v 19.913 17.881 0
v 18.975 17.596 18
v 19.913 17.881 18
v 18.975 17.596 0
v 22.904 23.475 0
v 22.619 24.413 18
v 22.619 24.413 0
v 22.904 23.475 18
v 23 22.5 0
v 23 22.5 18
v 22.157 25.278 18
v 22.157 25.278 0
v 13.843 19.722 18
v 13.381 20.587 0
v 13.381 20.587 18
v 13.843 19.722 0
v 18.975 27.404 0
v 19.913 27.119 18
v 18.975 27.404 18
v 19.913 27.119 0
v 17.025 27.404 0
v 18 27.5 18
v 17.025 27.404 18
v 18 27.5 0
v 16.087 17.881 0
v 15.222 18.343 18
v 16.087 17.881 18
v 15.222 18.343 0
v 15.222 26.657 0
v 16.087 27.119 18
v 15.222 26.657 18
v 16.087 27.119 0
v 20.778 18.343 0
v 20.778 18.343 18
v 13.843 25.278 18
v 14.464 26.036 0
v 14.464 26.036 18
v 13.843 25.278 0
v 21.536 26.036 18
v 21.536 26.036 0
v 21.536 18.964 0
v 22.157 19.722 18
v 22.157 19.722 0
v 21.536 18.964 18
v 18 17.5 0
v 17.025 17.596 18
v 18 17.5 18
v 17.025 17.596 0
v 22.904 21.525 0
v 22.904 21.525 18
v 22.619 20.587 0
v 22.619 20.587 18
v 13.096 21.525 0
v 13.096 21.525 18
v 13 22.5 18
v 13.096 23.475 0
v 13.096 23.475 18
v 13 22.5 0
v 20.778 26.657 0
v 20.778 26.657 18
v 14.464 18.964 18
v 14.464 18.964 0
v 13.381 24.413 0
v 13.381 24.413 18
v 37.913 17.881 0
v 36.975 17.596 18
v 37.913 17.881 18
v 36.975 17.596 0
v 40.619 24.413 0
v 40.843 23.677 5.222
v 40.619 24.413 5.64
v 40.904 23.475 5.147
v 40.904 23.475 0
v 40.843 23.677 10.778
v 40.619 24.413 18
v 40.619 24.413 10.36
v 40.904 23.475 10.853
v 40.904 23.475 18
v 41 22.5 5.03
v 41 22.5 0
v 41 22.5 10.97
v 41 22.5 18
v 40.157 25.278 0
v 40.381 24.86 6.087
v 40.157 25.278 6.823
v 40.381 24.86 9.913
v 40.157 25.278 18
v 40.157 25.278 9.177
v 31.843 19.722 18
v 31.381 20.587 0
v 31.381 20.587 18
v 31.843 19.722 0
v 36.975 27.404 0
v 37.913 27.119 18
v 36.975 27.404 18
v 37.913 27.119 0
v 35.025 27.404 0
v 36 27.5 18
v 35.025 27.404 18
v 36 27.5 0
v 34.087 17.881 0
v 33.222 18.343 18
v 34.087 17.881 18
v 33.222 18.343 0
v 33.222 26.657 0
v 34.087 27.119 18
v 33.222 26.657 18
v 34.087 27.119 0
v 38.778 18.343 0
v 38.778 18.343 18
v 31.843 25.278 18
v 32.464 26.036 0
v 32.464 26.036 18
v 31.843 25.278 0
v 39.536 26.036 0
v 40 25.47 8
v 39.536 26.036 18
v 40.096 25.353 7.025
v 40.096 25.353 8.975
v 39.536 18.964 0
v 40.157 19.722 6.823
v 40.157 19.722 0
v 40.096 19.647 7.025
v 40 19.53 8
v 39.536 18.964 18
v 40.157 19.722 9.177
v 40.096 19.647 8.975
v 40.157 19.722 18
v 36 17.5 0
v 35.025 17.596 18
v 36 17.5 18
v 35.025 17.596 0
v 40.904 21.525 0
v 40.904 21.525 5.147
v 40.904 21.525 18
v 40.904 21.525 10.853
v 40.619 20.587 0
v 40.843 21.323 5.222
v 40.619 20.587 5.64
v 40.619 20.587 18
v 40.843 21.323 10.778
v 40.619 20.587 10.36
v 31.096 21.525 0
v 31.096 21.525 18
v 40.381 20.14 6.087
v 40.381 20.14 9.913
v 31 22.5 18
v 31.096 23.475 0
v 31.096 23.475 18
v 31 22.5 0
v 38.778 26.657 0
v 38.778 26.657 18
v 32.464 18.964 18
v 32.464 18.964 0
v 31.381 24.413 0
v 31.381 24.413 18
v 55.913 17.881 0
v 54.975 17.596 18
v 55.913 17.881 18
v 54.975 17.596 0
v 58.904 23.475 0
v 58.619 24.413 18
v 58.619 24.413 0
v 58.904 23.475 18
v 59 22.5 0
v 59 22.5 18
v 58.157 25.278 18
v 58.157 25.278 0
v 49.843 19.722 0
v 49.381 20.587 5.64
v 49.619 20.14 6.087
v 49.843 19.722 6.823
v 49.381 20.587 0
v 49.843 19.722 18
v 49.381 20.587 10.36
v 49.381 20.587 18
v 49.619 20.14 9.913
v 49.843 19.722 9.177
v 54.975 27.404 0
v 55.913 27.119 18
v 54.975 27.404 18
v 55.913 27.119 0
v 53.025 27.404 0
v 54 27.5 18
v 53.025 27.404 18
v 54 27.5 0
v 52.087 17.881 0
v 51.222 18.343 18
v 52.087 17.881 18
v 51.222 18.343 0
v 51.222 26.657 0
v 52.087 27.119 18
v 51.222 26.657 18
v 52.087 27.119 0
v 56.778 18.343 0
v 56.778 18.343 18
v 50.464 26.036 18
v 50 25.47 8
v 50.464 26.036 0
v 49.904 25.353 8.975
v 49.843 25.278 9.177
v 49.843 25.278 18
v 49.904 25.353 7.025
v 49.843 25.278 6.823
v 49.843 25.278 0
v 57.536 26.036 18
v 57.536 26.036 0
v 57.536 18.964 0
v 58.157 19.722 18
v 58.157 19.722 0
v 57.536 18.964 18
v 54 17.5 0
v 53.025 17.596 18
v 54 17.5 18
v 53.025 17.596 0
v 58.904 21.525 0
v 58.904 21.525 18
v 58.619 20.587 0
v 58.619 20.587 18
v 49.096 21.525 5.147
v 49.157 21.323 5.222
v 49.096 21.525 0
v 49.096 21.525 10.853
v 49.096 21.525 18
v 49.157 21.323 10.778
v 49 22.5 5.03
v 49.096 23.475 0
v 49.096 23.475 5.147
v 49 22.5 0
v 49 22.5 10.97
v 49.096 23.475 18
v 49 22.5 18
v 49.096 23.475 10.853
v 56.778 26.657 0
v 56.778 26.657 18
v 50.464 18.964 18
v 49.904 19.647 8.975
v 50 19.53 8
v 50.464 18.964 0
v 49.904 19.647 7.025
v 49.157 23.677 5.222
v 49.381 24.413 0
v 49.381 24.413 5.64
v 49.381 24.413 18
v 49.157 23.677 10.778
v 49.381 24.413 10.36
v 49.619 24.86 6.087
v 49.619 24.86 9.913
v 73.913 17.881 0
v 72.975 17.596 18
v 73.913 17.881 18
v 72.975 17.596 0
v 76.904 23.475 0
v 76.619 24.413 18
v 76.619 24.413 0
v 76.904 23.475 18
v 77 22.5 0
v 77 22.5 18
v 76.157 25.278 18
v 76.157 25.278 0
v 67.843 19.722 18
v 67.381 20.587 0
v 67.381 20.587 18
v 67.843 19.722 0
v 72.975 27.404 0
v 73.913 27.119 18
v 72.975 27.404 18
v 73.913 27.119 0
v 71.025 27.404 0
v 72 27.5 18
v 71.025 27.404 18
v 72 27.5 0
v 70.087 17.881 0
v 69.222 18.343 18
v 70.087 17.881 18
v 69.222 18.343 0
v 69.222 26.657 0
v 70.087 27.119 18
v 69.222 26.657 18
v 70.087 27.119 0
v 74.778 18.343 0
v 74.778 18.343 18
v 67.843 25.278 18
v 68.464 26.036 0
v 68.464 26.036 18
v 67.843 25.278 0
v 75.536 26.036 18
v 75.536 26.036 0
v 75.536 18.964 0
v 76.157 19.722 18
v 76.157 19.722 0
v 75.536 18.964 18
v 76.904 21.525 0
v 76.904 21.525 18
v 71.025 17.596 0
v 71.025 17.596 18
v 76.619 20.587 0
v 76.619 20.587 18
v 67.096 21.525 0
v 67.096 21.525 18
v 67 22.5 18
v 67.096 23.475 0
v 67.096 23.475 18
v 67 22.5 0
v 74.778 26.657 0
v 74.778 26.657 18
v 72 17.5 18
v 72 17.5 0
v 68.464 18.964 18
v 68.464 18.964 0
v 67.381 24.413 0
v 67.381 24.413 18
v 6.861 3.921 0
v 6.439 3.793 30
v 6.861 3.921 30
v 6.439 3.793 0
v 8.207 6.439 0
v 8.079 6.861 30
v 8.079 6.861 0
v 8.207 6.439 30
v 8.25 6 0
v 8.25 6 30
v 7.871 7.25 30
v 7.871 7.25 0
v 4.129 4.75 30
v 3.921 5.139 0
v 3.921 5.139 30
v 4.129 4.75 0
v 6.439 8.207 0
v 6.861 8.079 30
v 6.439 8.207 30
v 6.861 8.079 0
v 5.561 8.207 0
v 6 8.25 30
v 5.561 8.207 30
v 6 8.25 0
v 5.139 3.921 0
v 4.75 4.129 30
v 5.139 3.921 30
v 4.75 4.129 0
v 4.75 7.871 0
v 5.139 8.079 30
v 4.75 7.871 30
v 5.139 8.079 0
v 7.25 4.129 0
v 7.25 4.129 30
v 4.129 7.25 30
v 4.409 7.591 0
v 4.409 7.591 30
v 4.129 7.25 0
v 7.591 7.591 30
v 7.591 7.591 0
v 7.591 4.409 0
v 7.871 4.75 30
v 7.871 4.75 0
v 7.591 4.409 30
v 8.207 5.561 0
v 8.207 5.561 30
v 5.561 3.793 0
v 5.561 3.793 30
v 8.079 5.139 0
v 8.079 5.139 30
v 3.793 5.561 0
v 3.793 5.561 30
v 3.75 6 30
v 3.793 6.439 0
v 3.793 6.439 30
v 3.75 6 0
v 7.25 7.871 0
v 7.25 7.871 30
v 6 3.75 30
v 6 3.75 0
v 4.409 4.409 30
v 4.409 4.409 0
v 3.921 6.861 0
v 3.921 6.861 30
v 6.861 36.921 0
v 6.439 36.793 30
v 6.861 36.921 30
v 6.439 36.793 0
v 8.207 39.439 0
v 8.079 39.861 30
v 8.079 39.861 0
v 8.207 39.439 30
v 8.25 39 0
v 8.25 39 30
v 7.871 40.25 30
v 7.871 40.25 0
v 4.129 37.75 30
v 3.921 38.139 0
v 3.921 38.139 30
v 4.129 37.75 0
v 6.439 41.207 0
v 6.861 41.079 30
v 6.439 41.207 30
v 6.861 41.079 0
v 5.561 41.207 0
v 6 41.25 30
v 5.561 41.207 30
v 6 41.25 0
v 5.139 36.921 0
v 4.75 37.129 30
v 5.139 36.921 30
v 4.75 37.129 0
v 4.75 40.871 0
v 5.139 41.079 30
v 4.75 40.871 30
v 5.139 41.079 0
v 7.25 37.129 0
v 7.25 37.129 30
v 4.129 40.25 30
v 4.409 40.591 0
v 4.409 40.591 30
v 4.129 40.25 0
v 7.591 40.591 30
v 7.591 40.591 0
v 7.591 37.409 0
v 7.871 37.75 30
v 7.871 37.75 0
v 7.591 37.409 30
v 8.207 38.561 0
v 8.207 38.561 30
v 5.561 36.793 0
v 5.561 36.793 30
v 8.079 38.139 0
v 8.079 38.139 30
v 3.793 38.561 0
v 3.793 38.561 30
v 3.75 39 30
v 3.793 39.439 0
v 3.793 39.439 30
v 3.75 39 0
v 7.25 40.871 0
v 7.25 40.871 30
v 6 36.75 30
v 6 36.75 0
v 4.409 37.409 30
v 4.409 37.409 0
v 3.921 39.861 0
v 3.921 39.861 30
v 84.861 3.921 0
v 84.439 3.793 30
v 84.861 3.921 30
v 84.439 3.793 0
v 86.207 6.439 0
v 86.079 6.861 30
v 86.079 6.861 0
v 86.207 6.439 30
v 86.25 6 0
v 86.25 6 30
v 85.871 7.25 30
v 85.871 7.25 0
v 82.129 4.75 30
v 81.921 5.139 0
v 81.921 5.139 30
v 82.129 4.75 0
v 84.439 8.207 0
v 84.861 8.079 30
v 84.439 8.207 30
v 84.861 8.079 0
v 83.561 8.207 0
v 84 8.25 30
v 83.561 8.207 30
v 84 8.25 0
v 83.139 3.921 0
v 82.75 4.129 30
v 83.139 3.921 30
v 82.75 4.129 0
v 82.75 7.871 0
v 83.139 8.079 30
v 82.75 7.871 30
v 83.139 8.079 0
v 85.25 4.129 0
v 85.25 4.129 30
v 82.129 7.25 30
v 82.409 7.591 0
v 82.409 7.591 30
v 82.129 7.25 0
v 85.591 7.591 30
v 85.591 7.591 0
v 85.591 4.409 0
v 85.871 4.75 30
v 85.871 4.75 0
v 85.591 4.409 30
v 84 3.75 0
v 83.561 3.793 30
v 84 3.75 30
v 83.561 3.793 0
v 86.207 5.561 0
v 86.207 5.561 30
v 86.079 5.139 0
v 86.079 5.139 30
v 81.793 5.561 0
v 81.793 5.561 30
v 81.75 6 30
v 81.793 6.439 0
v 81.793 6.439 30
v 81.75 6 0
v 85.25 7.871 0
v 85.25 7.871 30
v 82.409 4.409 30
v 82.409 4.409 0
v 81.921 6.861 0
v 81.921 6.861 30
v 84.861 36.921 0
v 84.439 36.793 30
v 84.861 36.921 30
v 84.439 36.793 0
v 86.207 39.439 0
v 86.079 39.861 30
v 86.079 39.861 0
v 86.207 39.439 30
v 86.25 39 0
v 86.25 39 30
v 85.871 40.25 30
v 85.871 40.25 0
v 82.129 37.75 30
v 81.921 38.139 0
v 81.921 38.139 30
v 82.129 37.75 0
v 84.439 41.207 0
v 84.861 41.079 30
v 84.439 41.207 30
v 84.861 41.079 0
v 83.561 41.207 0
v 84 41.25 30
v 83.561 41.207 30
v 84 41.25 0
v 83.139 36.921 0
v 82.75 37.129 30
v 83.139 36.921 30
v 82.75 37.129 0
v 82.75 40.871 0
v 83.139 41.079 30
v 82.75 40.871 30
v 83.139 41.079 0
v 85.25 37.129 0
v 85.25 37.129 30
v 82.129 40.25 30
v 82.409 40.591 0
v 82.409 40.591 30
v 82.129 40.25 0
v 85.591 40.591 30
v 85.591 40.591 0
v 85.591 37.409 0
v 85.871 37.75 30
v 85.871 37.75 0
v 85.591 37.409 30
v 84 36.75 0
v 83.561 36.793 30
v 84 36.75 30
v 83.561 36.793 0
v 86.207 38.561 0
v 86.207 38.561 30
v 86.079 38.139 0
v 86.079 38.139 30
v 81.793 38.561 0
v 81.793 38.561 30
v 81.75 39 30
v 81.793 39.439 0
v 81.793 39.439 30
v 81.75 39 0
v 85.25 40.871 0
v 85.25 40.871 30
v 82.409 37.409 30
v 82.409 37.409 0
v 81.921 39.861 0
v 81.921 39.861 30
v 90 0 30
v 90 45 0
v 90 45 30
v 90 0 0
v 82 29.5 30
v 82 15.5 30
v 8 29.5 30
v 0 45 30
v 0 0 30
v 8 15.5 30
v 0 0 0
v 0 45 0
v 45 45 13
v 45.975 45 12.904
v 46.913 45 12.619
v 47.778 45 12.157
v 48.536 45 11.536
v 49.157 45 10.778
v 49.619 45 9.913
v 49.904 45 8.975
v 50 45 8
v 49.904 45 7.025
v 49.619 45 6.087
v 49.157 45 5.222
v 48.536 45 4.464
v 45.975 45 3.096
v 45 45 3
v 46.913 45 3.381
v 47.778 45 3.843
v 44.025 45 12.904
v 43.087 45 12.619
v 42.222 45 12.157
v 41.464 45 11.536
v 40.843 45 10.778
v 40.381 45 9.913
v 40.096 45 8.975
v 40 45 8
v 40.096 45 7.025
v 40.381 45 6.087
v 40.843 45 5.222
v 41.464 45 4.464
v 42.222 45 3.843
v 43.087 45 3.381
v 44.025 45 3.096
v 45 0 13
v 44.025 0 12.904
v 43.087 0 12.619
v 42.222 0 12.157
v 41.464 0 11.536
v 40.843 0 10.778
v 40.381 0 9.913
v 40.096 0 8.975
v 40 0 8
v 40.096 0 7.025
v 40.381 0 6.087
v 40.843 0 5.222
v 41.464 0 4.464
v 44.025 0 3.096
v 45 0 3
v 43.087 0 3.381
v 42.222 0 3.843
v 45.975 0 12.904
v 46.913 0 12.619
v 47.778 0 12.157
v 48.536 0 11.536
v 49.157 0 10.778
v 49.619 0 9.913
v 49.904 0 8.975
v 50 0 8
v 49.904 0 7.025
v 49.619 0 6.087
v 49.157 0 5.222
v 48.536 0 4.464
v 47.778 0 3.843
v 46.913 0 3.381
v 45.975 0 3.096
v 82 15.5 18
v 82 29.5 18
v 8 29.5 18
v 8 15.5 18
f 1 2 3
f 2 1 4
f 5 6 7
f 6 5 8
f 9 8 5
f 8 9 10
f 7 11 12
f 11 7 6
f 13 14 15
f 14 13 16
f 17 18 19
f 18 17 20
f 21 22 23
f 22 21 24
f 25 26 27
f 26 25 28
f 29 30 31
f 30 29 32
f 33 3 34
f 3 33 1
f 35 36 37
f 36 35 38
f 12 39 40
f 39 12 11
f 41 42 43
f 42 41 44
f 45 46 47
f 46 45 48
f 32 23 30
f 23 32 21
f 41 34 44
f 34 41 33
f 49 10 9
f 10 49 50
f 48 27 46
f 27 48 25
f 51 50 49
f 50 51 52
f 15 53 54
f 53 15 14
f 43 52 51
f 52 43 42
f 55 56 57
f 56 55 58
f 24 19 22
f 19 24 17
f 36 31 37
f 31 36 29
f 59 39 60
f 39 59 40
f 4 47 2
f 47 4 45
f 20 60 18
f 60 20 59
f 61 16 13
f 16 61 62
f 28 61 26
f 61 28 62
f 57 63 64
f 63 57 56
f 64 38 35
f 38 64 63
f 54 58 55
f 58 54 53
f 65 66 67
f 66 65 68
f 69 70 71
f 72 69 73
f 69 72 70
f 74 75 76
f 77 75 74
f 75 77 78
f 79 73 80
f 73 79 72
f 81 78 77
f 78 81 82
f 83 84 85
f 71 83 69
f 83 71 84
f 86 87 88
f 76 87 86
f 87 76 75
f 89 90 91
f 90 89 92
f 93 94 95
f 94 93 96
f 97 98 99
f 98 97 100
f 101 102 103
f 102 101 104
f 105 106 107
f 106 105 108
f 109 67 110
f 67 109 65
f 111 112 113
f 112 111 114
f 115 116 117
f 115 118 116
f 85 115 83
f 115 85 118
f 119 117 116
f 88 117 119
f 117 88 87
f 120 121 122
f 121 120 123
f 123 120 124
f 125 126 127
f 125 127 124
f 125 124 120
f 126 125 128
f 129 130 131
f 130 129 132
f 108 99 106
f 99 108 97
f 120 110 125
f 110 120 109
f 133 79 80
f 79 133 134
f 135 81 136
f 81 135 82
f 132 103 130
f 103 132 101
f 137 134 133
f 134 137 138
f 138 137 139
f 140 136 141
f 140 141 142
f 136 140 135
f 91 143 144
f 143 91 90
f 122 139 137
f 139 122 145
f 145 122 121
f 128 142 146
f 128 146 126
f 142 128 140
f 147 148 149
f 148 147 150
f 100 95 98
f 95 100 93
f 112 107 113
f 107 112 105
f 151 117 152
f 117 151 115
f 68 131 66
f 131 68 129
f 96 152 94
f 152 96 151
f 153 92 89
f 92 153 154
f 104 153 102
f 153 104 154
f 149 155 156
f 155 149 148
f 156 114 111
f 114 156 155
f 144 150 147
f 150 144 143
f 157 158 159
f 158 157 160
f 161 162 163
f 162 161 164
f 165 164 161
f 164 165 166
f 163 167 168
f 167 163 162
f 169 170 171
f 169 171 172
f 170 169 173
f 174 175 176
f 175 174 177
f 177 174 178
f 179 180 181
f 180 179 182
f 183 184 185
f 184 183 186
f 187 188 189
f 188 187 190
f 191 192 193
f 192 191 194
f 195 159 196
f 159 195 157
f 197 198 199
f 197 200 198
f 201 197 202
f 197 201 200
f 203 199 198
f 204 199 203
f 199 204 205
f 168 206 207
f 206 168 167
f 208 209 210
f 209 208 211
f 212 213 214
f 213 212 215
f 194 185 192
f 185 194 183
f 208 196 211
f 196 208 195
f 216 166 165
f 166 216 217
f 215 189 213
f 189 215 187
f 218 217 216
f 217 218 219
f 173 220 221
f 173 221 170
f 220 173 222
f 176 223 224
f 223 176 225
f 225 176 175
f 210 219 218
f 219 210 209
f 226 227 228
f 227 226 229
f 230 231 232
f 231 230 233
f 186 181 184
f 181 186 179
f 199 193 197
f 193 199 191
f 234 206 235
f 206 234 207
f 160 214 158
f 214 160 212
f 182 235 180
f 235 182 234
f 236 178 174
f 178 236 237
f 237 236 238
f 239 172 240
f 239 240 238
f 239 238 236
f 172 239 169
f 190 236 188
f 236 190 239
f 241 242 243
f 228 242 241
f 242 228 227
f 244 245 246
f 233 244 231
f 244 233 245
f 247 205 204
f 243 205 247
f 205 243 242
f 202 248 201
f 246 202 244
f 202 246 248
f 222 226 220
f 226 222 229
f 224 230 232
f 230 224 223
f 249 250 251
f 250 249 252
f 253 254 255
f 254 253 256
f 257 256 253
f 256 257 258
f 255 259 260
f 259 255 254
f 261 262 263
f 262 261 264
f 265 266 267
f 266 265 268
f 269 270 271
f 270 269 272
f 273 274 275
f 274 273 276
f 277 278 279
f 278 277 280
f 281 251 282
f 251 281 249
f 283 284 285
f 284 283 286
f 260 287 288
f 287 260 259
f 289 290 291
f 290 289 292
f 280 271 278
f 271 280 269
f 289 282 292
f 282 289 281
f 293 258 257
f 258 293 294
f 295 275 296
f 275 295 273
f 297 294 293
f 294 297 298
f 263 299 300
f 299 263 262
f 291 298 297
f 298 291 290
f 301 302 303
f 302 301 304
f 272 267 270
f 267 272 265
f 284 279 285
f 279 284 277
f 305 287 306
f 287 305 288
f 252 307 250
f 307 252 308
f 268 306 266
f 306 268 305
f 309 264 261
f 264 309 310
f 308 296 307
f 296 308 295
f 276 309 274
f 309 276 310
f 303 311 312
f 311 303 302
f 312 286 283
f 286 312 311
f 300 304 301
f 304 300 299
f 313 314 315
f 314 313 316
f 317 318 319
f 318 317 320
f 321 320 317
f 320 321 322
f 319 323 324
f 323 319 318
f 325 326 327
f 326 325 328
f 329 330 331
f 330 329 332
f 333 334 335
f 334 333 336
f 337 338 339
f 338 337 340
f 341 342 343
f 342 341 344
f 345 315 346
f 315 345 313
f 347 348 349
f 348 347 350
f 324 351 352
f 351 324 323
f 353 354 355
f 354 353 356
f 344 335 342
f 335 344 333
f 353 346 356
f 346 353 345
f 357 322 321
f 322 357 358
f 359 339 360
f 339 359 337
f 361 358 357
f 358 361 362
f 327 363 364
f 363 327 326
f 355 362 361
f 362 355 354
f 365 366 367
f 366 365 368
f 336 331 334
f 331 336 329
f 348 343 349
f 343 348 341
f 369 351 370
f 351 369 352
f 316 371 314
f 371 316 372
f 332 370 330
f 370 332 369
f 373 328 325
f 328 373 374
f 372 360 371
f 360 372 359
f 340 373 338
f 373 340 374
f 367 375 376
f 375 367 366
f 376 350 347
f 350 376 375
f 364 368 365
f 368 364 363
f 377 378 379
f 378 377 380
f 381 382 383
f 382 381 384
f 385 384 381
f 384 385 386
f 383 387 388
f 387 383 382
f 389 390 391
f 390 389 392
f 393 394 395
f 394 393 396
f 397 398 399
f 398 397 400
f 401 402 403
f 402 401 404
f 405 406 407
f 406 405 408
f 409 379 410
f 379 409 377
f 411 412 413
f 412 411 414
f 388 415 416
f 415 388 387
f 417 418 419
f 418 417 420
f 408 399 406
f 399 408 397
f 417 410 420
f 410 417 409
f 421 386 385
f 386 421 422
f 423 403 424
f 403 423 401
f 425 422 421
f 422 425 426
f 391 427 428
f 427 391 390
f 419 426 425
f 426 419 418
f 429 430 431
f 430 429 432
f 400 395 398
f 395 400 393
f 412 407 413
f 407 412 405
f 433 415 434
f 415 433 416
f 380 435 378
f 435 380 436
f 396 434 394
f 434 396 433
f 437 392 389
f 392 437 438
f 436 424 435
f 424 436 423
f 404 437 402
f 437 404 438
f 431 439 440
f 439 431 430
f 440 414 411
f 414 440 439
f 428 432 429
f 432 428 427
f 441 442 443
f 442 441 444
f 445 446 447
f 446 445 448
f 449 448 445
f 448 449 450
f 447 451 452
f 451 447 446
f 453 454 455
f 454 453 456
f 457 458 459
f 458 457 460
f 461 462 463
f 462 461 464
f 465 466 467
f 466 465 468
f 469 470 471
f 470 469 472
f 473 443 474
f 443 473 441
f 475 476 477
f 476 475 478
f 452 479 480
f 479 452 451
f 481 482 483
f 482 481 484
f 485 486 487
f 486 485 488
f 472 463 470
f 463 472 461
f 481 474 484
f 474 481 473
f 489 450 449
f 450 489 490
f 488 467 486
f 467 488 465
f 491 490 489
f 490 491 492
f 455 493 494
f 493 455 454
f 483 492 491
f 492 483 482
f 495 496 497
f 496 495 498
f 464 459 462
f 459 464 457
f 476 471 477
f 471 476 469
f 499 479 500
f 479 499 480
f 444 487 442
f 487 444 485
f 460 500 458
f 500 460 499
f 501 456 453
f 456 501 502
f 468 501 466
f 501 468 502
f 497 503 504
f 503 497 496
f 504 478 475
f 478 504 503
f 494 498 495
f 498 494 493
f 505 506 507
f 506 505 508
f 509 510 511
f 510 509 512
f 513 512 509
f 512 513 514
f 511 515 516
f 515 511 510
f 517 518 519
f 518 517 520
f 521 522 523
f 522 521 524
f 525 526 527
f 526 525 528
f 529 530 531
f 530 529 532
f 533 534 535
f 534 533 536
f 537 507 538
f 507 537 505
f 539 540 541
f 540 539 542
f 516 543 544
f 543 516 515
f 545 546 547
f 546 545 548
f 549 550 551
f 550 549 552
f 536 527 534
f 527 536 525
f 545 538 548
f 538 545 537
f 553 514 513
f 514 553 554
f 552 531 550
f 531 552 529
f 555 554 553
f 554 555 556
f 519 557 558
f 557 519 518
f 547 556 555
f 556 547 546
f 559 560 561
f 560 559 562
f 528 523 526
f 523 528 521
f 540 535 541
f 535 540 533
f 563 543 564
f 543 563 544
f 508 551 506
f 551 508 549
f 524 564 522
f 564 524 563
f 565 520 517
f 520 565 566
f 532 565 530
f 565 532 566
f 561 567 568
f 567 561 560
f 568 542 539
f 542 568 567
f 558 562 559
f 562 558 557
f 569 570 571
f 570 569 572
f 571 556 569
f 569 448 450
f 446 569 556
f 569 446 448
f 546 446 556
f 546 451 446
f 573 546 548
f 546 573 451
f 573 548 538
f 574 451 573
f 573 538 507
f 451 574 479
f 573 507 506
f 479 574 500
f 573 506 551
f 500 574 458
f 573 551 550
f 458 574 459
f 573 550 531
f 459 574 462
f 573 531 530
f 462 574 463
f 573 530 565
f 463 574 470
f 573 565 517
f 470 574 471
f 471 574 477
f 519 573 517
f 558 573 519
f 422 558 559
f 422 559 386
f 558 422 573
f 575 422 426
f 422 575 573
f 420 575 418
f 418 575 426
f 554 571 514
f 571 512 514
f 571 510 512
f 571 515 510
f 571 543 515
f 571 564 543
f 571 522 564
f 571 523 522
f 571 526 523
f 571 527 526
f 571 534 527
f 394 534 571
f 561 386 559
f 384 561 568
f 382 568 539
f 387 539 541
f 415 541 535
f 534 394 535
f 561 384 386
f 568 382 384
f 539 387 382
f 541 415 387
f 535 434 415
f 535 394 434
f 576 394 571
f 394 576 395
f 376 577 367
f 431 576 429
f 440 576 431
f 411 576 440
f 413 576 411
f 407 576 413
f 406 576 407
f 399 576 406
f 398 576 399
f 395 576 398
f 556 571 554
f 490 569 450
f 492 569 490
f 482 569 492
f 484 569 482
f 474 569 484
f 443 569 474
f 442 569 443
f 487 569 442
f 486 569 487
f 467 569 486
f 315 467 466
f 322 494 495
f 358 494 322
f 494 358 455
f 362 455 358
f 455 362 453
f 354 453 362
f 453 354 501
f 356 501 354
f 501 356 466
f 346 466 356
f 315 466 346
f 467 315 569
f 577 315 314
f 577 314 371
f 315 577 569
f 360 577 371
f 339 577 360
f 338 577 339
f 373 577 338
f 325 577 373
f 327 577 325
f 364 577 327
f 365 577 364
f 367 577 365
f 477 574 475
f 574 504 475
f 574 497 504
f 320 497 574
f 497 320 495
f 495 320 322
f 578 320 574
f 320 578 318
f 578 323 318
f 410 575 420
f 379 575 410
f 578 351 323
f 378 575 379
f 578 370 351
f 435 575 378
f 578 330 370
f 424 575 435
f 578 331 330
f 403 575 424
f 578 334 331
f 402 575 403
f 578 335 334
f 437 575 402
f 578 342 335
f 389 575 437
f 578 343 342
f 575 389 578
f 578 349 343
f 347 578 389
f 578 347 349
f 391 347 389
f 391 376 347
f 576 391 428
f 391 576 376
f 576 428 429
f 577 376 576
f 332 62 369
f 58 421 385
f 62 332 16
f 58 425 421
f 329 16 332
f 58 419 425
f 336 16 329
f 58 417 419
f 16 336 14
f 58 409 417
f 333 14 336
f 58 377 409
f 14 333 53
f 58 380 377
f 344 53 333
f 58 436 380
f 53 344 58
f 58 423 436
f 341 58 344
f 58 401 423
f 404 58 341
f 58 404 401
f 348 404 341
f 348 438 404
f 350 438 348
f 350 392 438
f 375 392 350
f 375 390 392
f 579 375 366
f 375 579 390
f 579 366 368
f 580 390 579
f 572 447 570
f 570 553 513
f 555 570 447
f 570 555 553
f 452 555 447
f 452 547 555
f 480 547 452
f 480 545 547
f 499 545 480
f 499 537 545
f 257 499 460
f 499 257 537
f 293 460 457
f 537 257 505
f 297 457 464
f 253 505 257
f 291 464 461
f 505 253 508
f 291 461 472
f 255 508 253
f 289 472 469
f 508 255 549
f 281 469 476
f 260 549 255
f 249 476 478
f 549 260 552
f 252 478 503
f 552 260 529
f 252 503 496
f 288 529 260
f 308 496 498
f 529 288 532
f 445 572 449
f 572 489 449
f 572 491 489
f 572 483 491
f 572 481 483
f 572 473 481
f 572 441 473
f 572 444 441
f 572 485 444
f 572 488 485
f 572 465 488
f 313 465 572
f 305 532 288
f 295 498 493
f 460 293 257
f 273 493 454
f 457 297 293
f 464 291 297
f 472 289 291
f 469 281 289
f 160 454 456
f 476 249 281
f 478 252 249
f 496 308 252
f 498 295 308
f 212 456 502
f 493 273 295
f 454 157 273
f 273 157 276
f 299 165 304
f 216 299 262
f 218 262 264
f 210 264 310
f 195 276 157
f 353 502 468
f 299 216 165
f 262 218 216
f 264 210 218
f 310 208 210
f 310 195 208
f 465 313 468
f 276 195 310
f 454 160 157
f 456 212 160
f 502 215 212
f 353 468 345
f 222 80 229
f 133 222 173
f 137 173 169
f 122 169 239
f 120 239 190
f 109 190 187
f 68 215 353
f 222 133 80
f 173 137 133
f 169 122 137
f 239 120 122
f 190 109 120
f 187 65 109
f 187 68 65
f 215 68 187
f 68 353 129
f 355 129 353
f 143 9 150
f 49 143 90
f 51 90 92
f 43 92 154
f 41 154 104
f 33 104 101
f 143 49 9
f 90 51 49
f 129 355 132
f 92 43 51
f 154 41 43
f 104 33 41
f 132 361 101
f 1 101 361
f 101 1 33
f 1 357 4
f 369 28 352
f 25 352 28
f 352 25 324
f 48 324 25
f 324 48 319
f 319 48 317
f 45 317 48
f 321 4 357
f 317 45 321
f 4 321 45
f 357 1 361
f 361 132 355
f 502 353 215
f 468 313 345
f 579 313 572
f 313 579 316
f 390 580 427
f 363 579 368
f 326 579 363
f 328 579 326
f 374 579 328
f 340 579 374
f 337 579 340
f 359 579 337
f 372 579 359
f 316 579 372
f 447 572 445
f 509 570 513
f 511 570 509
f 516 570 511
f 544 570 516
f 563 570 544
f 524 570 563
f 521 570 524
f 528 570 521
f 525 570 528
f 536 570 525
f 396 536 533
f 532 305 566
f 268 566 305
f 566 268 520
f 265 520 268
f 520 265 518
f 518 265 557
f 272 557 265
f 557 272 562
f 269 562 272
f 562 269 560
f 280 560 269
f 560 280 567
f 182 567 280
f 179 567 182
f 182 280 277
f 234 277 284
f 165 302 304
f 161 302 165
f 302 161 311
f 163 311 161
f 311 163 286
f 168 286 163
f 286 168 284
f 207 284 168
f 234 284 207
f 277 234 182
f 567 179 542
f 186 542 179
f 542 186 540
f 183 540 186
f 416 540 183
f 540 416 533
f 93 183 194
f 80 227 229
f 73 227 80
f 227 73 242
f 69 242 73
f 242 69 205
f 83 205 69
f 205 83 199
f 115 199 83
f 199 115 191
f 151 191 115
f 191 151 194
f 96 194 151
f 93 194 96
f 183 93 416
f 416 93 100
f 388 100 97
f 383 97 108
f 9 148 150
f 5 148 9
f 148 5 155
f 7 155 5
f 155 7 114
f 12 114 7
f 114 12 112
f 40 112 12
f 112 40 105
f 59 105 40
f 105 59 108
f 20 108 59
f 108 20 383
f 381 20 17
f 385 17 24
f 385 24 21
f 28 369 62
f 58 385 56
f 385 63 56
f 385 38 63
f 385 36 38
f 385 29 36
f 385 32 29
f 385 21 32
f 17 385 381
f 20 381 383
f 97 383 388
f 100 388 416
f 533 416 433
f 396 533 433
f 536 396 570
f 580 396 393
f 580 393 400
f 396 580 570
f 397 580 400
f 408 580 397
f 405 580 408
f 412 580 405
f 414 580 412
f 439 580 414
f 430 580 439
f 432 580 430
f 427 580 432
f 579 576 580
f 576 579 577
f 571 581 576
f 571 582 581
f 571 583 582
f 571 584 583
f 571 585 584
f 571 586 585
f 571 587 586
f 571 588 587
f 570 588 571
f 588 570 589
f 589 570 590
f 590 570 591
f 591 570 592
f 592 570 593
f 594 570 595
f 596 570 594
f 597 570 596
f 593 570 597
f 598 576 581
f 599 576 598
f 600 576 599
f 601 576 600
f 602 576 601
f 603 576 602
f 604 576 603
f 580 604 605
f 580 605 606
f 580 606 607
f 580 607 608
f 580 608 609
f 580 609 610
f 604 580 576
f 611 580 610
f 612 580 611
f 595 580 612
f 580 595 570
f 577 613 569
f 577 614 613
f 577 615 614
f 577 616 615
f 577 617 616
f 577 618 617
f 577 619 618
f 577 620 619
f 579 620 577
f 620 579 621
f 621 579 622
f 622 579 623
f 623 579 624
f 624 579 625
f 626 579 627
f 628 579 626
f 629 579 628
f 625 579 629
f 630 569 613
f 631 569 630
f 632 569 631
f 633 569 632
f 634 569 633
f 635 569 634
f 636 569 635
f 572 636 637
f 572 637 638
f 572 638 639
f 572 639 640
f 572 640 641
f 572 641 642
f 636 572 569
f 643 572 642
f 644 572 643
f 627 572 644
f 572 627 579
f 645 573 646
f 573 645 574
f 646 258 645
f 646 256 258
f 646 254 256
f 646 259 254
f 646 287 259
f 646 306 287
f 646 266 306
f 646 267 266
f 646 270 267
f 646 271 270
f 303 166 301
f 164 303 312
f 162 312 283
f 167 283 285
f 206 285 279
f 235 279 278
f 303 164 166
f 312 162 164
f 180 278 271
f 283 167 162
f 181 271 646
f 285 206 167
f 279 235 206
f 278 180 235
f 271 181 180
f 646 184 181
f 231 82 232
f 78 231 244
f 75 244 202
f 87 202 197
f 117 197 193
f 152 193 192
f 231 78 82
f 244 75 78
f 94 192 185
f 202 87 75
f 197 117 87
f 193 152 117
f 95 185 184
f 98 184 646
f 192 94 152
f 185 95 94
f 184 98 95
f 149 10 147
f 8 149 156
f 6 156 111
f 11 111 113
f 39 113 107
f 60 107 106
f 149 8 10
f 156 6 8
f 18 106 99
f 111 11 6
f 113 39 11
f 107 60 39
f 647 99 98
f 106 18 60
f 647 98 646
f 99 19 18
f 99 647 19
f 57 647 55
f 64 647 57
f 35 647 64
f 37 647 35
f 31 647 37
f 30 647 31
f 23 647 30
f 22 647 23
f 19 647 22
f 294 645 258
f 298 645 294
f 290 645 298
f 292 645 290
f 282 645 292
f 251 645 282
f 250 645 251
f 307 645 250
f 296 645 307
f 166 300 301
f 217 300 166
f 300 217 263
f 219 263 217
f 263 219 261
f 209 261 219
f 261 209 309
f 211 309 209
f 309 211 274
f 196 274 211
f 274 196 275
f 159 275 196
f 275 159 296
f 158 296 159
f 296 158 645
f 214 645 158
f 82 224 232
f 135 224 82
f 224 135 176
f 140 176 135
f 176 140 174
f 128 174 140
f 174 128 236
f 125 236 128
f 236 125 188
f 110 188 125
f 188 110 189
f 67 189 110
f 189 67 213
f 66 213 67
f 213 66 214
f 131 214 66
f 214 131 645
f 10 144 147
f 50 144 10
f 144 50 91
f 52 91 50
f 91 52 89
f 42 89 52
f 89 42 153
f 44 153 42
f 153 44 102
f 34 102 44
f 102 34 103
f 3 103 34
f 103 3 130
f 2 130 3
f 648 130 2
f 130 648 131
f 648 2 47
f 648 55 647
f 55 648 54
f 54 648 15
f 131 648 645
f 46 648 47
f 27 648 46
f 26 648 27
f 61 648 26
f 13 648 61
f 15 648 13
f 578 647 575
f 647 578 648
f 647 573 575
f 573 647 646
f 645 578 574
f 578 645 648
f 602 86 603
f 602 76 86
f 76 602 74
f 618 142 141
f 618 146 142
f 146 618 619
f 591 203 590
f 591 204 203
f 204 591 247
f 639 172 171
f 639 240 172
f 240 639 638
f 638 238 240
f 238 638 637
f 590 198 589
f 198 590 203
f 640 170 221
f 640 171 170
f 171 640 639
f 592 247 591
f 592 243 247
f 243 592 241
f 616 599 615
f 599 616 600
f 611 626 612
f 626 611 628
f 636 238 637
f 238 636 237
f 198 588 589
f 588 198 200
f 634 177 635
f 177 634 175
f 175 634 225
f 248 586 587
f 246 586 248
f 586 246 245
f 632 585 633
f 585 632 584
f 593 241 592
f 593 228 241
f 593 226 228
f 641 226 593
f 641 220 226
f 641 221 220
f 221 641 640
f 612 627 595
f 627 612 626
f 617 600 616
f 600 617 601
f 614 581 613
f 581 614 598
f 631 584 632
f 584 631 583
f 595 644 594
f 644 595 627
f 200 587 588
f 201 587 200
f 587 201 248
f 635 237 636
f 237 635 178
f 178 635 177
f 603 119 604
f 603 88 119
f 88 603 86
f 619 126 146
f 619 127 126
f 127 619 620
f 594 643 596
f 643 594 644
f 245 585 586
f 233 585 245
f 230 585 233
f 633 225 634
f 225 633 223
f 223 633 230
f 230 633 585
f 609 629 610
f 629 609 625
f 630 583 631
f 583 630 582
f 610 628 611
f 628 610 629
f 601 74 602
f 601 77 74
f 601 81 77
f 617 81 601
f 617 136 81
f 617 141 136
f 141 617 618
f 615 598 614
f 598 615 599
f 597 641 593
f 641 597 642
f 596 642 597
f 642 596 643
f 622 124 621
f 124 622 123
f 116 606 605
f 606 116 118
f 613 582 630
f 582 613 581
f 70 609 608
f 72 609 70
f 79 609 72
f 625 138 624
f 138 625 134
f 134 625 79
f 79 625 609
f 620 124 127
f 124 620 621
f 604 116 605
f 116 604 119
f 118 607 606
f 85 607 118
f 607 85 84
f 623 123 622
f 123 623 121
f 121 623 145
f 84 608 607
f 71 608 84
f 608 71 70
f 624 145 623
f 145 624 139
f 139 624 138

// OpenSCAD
$fn = 32;

// ----------------------------------------------------------------------
// Manifold block: side_outlet manifold
// ----------------------------------------------------------------------

// --- parameters (mm) ---
block_l = 90;             // block length, X
block_w = 45;             // block width, Y
block_h = 30;             // block height, Z
port_d = 10;              // port bore diameter
port_pitch = 18;          // port pitch along X
gallery_d = 14;           // top gallery width, Y
gallery_depth = 12;       // gallery pocket depth
wall_p = 8;               // gallery end wall thickness, X
mnt_d = 4.5;              // mounting hole diameter
mnt_in = 6;               // mounting hole inset from the edges
out_d = 10;               // outlet bore diameter
out_z = 8;                // outlet axis height

n_ports = 4;  // ports in the row
port_x0 = (block_l - (n_ports - 1) * port_pitch) / 2;  // first port X

difference() {
  cube([block_l, block_w, block_h]);
  for (i = [0 : n_ports - 1])
    translate([port_x0 + i * port_pitch, block_w / 2, -1])
      cylinder(h = block_h + 2, d = port_d);
  translate([wall_p, block_w / 2 - gallery_d / 2, block_h - gallery_depth])
    cube([block_l - 2 * wall_p, gallery_d, gallery_depth + 1]);
  for (cx = [mnt_in, block_l - mnt_in])
    for (cy = [mnt_in, block_w - mnt_in])
      translate([cx, cy, -1]) cylinder(h = block_h + 2, d = mnt_d);
  translate([block_l / 2, -1, out_z]) rotate([-90, 0, 0])
    cylinder(h = block_w + 2, d = out_d);
}
